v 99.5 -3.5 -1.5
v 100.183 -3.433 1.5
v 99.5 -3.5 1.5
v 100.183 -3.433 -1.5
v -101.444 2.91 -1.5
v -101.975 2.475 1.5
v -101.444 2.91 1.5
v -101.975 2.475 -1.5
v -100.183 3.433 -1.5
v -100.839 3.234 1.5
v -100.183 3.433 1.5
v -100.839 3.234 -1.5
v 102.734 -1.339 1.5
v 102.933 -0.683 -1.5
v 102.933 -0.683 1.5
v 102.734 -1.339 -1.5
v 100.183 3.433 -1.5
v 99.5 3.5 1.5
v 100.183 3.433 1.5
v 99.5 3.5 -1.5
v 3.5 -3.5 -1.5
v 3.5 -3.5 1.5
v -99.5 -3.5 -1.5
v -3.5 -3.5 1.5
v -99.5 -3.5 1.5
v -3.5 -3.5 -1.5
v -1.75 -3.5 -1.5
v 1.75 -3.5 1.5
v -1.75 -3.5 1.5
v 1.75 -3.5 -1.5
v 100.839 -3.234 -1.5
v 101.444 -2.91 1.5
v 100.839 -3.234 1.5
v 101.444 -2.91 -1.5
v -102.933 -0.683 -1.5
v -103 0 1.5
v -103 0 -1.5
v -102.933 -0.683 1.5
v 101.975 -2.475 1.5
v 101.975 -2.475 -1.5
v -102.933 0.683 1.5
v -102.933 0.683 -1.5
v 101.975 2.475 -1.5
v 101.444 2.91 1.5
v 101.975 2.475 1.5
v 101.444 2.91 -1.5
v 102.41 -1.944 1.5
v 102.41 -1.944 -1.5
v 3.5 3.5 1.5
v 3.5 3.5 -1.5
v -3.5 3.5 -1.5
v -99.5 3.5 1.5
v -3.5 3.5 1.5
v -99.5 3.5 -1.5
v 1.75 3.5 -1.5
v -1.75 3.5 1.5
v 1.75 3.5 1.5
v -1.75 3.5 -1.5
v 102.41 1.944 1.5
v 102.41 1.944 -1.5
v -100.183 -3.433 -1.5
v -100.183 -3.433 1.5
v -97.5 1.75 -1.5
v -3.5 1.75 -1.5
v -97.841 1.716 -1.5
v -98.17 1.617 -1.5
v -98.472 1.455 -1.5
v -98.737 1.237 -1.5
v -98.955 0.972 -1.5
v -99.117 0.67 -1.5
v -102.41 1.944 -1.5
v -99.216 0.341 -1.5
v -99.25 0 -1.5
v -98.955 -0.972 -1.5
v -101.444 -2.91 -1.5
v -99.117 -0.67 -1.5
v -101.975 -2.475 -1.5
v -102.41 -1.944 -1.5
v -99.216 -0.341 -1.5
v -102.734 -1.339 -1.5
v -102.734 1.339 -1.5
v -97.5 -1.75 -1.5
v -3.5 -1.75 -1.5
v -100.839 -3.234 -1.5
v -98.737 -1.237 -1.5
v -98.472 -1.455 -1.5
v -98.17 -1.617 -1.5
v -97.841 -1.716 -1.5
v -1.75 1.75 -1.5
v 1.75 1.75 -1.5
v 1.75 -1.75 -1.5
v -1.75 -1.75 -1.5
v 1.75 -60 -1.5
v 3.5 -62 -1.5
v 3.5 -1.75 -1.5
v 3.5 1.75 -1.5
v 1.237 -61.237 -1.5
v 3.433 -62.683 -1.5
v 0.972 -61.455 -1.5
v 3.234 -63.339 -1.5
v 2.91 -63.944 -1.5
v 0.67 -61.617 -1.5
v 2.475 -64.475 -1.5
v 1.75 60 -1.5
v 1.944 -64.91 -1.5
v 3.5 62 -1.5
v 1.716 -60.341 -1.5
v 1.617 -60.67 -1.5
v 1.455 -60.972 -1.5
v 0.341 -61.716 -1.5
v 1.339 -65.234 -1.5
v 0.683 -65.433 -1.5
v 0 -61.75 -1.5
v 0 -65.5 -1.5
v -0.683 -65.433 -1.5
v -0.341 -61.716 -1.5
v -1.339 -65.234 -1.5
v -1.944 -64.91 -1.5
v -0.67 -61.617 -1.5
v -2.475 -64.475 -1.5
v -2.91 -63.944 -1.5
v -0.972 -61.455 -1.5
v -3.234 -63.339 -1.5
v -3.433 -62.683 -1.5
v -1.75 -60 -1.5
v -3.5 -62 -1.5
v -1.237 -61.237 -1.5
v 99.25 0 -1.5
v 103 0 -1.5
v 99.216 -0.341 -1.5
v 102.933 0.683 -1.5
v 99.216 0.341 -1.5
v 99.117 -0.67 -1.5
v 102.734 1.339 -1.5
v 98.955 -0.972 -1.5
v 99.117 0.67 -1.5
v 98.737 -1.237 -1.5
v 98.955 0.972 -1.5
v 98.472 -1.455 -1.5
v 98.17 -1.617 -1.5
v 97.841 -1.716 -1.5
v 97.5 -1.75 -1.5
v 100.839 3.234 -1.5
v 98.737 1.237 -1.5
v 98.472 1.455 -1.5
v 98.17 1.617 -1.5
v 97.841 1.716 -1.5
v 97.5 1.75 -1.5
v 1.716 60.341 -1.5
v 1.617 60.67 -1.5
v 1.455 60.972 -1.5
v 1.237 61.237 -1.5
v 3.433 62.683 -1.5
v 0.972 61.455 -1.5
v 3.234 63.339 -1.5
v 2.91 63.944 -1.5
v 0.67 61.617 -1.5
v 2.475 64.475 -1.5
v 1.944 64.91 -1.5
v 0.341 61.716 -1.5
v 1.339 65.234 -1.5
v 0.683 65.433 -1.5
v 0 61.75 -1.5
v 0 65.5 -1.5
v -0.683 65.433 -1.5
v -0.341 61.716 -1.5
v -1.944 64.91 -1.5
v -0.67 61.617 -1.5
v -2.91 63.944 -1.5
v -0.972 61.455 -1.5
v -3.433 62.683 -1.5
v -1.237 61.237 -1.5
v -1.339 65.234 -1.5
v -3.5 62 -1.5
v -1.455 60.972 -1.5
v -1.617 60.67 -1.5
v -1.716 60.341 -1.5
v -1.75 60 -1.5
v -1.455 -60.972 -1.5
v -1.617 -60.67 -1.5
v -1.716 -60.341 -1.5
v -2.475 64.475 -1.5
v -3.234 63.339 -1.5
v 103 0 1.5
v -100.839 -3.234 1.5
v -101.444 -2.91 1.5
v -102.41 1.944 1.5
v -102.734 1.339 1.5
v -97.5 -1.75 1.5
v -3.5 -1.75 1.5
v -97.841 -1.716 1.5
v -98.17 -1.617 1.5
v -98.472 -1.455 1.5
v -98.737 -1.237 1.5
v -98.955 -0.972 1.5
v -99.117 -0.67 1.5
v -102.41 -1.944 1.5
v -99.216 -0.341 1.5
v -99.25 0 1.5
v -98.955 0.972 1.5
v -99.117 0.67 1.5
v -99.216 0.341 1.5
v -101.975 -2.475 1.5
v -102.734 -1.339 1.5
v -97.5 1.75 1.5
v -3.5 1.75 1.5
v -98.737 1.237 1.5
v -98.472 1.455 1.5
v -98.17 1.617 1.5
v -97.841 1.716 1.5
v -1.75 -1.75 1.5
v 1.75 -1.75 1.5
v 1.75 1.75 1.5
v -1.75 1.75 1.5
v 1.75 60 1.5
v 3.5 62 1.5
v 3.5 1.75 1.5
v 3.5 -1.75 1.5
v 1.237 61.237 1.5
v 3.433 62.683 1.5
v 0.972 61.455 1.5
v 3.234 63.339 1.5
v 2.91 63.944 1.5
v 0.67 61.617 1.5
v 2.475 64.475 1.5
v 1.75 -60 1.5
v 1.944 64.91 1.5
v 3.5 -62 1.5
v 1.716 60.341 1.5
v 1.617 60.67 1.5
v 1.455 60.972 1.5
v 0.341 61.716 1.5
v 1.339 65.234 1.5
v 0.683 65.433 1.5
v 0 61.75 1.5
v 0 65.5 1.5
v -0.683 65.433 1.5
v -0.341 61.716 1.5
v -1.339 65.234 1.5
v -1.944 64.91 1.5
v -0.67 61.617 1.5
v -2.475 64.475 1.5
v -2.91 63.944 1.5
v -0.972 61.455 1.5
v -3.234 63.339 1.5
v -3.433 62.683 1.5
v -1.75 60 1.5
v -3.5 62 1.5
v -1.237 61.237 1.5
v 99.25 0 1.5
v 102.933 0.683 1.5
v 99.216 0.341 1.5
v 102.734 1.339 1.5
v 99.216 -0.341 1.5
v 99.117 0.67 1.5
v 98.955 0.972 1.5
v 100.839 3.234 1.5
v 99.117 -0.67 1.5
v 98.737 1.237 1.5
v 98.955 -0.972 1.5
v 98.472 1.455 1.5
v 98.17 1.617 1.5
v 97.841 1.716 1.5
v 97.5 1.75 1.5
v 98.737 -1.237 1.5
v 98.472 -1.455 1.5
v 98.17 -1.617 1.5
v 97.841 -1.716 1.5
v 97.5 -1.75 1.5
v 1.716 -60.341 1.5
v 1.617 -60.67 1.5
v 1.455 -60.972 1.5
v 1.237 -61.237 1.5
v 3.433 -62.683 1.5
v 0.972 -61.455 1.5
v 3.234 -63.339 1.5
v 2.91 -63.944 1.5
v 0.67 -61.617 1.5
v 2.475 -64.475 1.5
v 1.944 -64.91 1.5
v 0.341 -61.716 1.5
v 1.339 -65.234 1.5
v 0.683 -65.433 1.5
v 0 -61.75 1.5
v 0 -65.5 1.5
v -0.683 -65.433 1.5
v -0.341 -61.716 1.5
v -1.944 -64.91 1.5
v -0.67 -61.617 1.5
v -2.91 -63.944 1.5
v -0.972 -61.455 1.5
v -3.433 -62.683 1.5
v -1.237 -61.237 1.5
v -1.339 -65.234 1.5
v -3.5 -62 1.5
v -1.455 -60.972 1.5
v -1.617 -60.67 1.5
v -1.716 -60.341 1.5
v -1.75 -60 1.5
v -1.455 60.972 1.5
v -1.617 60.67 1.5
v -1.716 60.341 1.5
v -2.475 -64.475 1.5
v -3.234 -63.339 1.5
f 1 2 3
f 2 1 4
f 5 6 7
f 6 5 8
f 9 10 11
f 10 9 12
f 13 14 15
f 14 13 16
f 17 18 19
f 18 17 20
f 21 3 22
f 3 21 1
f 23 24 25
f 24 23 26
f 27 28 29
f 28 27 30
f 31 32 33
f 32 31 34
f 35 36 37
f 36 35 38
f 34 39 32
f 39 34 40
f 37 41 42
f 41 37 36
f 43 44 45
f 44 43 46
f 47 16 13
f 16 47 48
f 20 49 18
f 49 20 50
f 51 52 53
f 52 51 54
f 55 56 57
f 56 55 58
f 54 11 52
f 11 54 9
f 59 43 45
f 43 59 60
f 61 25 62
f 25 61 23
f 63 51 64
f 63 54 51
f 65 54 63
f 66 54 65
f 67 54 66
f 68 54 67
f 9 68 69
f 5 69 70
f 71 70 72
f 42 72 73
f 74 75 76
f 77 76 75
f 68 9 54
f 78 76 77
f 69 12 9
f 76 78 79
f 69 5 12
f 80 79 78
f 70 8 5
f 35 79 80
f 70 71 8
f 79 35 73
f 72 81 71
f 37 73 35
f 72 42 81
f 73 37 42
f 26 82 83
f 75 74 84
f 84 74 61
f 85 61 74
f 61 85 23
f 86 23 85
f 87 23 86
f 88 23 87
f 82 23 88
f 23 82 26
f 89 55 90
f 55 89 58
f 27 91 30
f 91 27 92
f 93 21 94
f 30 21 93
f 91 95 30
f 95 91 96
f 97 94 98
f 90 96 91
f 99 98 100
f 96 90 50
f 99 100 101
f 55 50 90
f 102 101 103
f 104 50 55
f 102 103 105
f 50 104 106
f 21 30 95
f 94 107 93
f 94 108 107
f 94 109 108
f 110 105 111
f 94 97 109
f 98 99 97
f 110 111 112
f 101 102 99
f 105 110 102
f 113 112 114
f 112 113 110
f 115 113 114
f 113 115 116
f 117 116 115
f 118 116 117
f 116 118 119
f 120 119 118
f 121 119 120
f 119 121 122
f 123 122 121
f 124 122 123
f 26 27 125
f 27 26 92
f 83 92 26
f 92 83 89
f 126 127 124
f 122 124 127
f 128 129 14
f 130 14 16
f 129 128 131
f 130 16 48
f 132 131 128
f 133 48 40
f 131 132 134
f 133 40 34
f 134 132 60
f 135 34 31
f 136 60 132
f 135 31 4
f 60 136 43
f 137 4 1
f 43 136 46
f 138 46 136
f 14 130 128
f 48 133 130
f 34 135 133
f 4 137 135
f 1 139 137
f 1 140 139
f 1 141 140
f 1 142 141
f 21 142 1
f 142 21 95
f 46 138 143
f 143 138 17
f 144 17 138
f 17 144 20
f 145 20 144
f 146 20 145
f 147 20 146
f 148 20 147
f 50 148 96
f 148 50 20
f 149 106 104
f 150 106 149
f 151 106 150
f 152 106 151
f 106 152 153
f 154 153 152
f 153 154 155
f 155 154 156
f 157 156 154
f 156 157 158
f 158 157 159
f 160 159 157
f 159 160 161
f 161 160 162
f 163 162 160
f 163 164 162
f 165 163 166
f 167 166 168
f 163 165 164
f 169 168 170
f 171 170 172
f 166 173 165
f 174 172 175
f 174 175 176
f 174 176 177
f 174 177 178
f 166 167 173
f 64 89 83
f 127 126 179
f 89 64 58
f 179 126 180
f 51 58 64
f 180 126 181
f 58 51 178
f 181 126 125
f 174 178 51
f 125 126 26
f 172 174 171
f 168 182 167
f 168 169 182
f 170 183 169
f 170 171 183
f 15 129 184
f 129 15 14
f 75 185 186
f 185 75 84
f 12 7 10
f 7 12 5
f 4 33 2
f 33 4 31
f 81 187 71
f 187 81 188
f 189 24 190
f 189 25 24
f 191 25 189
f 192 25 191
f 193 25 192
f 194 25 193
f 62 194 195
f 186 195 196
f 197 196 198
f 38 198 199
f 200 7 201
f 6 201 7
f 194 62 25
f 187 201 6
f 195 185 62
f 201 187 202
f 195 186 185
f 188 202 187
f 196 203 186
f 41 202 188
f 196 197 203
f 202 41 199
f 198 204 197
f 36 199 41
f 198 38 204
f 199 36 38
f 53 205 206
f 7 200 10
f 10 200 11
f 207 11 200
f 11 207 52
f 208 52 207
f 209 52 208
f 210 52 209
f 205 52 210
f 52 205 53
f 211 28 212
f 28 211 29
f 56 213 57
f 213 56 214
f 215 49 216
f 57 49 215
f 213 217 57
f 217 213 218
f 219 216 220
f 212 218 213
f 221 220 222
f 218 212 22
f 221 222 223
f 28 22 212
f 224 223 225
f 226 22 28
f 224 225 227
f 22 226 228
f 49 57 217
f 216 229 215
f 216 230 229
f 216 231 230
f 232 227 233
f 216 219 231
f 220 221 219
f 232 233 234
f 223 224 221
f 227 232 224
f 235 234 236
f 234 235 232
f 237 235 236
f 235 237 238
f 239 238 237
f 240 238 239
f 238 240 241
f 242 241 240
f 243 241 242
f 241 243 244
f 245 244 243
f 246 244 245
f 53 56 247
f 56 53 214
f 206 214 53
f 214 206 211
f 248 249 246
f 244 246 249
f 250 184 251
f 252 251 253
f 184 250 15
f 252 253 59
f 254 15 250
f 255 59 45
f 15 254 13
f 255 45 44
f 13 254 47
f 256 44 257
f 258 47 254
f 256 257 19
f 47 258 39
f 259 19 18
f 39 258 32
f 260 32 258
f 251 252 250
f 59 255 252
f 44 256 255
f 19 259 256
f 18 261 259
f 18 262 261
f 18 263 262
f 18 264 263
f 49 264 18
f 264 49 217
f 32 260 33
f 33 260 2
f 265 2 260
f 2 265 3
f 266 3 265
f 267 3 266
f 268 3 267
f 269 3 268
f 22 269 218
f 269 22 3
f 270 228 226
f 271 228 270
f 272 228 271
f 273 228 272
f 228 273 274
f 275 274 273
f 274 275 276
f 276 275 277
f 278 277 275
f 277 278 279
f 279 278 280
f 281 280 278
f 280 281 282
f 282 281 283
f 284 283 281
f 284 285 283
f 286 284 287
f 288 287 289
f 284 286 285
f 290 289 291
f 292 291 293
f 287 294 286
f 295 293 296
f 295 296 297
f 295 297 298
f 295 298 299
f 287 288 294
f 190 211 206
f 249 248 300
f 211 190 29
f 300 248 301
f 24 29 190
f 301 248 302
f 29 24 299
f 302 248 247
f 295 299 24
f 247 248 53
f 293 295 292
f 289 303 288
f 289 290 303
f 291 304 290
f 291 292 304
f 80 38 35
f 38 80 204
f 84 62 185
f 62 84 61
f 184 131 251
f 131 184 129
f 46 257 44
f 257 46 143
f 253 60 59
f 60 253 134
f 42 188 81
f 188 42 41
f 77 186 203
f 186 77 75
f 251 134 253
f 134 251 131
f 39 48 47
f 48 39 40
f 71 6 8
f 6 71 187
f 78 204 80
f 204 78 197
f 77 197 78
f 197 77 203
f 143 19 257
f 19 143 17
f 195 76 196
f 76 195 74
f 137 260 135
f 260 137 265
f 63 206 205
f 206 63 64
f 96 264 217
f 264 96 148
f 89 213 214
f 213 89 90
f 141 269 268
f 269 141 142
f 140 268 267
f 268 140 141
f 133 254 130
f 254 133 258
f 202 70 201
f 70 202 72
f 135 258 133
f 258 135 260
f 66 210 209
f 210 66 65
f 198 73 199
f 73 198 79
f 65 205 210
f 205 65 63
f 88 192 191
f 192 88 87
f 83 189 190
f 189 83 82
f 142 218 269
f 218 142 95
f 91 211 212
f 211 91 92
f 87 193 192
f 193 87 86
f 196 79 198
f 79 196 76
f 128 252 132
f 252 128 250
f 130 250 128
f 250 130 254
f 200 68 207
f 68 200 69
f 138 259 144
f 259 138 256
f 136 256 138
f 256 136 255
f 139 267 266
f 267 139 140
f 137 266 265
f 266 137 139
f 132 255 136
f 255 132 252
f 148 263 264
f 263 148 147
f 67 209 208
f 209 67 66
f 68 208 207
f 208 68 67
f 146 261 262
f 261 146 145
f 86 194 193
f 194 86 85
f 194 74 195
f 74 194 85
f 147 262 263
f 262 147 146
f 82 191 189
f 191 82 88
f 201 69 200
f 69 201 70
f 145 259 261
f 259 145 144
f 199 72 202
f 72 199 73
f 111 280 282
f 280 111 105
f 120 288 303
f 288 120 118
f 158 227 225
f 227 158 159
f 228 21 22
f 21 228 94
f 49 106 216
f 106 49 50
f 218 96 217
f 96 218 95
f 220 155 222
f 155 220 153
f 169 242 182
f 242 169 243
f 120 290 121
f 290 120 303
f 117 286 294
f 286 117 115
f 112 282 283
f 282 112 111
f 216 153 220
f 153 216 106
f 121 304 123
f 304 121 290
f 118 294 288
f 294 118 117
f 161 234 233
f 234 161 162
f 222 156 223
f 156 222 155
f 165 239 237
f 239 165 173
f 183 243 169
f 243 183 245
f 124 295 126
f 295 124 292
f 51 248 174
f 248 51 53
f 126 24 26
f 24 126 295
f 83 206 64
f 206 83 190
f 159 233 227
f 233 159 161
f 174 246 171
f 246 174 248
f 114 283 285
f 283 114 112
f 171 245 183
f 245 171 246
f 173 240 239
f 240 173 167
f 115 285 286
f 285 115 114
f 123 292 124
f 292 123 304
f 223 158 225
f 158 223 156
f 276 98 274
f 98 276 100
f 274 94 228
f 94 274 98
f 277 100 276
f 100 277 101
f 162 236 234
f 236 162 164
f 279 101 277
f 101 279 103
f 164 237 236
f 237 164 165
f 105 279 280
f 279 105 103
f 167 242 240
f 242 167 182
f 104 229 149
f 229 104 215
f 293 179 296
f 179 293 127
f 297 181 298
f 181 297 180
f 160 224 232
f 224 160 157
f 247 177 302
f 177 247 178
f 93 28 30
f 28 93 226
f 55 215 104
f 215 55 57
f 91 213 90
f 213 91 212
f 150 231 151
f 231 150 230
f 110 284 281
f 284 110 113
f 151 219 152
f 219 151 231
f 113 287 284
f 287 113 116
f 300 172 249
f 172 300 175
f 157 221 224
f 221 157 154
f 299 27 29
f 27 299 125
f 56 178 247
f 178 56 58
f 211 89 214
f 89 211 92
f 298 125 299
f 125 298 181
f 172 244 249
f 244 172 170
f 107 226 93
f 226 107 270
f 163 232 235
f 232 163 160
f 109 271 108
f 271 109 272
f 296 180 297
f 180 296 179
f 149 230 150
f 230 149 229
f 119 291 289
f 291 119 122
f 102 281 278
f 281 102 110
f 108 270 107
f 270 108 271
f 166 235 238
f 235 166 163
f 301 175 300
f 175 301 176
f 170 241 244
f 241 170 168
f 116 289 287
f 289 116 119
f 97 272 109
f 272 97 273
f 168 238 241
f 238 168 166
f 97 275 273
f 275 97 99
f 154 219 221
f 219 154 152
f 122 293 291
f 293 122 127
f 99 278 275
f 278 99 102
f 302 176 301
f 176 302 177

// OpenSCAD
// file: ocular.scad
module top(){
    difference(){
        cylinder(d=30, h=5, center=true);
        cylinder(d=23-0.5-3, h=15, center=true);
    }
}

module ocular(){
    translate([0, 0, 35/2+5/2])
    top();
    
    difference(){
        cylinder(d=23-0.5, h=35, center=true);  
        cylinder(d=23-0.5-3, h=40, center=true);   
    }
}
// file: smartphone.scad
$fn = 128;
r_round_corner = 15;

module smartphone(){
    block();
    cameras();
}

module cameras(){
    color("blue")
    translate([154/2-13,79/2-13,0])
    cylinder(d=14,h=15, center=true);
}

module block(){
    // Желтый корпус — ОБЯЗАТЕЛЬНО указываем цвет
    color("yellow")
    hull(){
        translate([154/2 - r_round_corner/2,79/2 - r_round_corner/2,0])
        cylinder(d=r_round_corner, h=9,center=true);
        
        mirror([1,0,0])
        translate([154/2 - r_round_corner/2,79/2 - r_round_corner/2,0])
        cylinder(d=r_round_corner, h=9,center=true);
        
        mirror([0,1,0])
        translate([154/2 - r_round_corner/2,79/2 - r_round_corner/2,0])
        cylinder(d=r_round_corner, h=9,center=true);
        
        mirror([1,0,0])
        mirror([0,1,0])
        translate([154/2 - r_round_corner/2,79/2 - r_round_corner/2,0])
        cylinder(d=r_round_corner, h=9,center=true);
    }

    // Зеленая L-рамка — отдельно, но поверх
    color("green")
    union(){
        // Вертикальная полоса слева
        translate([-154/2 - 5, 0, 0])
        cube([10, 79 + 20, 9], center=true);

        // Горизонтальная полоса снизу
        translate([0, -79/2 - 5, 0])
        cube([154 + 20, 10, 9], center=true);
    }
}
// main file
use <smartphone.scad>
use <ocular.scad>
phone_height = 154;
phone_width = 79;




//translate([phone_height/2-23/2-19,phone_width/2-23/2-2,35/2+15])
//rotate([180,0,0])
//ocular();
//frame1();
//translate([0,25,3])
//color("red")
//corner(thickness=20);

//crossbar_vertical(length=phone_height+40);

frame_crossbar();


module frame_crossbar(){
crossbar_vertical(length=154+45);
crossbar_horizontal(length=79+45);
}

module crossbar_horizontal(length ){
    rotate([0, 0, 90])
    crossbar_vertical(length);
}

module crossbar_vertical(length){
    difference(){
        hull(){
            translate([-(length)/2,0,0])
            cylinder(d=7,h=3, center = true, $fn=32);
            
            translate([(length)/2,0,0])
            cylinder(d=7,h=3, center = true, $fn=32);
        }
        
        hull(){
            translate([-(length)/2+2,0,0])
            cylinder(d=3.5,h=10, center = true, $fn=32);
              
            translate([(length)/2-2,0,0])
            cylinder(d=3.5,h=10, center = true, $fn=32);
        }
    }
}

//difference(){
//    color("red")
//    corner(thickness=20);
//    
//    holes_corner();
//}



module nut_m3(){
    cylinder(d=6+0.5,h=4,center=true, $fn=6);
    cylinder(d=6+0.5,h=1,center=true, $fn=64);
}

module holes_corner(){
    translate([40,40,0.])
    rotate([90,0,0])
    cylinder(d=3.5,h=25, center = true, $fn=64);
    
    translate([80,40,0.])
    rotate([90,0,0])
    cylinder(d=3.5,h=25, center = true, $fn=64);
    
    translate([100,20,0.])
    rotate([0,90,0])
    cylinder(d=3.5,h=25, center = true, $fn=64);
    
    translate([100,-20,0.])
    rotate([0,90,0])
    cylinder(d=3.5,h=25, center = true, $fn=64);
    
    translate([95,-20,0])
    rotate([0,90,0])
    nut_m3();
    
    translate([95,20,0])
    rotate([0,90,0])
    nut_m3();
    
    translate([40,32.5,0])
    rotate([0,90,90])
    nut_m3();
    
    translate([80,32.5,0])
    rotate([0,90,90])
    nut_m3();
}
//difference(){
//    translate([phone_height/2-14, 22.5, 11.5])
//    cube([phone_height/2,phone_width, 3],center=true);
//    translate([phone_height/2-23/2-19,phone_width/2-23/2-2,35/2])
//    cylinder(d=23-0.5-3,h=40,center=true);
//}
module frame1(){
    difference(){
        color("green")
        translate([phone_height/2-phone_height/4+10,10,0])
        cube([phone_height/2,phone_width+10, 10], center=true);
        scale([1,1,2])
        block();
    }
}



module corner(thickness){
    translate([phone_height/2+20,0,0])
    frame2(thickness);
    
    translate([phone_height/2 - 13.5, phone_width/2,0])
    rotate([0,0,90])
    frame2(thickness);

}
module frame2(thickness){
    hull(){
        translate([5,phone_width/2,0])
        cylinder(d=5, h=thickness,center=true,$fn=32);
        
        mirror([1,0,0])
        translate([5,phone_width/2,0])
        cylinder(d=5, h=thickness,center=true,$fn=32);
        
        mirror([0,1,0])
        translate([5,phone_width/2,0])
        cylinder(d=5, h=thickness,center=true,$fn=32);
        
        mirror([1,0,0])
        mirror([0,1,0])
        translate([5,phone_width/2,0])
        cylinder(d=5, h=thickness,center=true,$fn=32);
    }
}
